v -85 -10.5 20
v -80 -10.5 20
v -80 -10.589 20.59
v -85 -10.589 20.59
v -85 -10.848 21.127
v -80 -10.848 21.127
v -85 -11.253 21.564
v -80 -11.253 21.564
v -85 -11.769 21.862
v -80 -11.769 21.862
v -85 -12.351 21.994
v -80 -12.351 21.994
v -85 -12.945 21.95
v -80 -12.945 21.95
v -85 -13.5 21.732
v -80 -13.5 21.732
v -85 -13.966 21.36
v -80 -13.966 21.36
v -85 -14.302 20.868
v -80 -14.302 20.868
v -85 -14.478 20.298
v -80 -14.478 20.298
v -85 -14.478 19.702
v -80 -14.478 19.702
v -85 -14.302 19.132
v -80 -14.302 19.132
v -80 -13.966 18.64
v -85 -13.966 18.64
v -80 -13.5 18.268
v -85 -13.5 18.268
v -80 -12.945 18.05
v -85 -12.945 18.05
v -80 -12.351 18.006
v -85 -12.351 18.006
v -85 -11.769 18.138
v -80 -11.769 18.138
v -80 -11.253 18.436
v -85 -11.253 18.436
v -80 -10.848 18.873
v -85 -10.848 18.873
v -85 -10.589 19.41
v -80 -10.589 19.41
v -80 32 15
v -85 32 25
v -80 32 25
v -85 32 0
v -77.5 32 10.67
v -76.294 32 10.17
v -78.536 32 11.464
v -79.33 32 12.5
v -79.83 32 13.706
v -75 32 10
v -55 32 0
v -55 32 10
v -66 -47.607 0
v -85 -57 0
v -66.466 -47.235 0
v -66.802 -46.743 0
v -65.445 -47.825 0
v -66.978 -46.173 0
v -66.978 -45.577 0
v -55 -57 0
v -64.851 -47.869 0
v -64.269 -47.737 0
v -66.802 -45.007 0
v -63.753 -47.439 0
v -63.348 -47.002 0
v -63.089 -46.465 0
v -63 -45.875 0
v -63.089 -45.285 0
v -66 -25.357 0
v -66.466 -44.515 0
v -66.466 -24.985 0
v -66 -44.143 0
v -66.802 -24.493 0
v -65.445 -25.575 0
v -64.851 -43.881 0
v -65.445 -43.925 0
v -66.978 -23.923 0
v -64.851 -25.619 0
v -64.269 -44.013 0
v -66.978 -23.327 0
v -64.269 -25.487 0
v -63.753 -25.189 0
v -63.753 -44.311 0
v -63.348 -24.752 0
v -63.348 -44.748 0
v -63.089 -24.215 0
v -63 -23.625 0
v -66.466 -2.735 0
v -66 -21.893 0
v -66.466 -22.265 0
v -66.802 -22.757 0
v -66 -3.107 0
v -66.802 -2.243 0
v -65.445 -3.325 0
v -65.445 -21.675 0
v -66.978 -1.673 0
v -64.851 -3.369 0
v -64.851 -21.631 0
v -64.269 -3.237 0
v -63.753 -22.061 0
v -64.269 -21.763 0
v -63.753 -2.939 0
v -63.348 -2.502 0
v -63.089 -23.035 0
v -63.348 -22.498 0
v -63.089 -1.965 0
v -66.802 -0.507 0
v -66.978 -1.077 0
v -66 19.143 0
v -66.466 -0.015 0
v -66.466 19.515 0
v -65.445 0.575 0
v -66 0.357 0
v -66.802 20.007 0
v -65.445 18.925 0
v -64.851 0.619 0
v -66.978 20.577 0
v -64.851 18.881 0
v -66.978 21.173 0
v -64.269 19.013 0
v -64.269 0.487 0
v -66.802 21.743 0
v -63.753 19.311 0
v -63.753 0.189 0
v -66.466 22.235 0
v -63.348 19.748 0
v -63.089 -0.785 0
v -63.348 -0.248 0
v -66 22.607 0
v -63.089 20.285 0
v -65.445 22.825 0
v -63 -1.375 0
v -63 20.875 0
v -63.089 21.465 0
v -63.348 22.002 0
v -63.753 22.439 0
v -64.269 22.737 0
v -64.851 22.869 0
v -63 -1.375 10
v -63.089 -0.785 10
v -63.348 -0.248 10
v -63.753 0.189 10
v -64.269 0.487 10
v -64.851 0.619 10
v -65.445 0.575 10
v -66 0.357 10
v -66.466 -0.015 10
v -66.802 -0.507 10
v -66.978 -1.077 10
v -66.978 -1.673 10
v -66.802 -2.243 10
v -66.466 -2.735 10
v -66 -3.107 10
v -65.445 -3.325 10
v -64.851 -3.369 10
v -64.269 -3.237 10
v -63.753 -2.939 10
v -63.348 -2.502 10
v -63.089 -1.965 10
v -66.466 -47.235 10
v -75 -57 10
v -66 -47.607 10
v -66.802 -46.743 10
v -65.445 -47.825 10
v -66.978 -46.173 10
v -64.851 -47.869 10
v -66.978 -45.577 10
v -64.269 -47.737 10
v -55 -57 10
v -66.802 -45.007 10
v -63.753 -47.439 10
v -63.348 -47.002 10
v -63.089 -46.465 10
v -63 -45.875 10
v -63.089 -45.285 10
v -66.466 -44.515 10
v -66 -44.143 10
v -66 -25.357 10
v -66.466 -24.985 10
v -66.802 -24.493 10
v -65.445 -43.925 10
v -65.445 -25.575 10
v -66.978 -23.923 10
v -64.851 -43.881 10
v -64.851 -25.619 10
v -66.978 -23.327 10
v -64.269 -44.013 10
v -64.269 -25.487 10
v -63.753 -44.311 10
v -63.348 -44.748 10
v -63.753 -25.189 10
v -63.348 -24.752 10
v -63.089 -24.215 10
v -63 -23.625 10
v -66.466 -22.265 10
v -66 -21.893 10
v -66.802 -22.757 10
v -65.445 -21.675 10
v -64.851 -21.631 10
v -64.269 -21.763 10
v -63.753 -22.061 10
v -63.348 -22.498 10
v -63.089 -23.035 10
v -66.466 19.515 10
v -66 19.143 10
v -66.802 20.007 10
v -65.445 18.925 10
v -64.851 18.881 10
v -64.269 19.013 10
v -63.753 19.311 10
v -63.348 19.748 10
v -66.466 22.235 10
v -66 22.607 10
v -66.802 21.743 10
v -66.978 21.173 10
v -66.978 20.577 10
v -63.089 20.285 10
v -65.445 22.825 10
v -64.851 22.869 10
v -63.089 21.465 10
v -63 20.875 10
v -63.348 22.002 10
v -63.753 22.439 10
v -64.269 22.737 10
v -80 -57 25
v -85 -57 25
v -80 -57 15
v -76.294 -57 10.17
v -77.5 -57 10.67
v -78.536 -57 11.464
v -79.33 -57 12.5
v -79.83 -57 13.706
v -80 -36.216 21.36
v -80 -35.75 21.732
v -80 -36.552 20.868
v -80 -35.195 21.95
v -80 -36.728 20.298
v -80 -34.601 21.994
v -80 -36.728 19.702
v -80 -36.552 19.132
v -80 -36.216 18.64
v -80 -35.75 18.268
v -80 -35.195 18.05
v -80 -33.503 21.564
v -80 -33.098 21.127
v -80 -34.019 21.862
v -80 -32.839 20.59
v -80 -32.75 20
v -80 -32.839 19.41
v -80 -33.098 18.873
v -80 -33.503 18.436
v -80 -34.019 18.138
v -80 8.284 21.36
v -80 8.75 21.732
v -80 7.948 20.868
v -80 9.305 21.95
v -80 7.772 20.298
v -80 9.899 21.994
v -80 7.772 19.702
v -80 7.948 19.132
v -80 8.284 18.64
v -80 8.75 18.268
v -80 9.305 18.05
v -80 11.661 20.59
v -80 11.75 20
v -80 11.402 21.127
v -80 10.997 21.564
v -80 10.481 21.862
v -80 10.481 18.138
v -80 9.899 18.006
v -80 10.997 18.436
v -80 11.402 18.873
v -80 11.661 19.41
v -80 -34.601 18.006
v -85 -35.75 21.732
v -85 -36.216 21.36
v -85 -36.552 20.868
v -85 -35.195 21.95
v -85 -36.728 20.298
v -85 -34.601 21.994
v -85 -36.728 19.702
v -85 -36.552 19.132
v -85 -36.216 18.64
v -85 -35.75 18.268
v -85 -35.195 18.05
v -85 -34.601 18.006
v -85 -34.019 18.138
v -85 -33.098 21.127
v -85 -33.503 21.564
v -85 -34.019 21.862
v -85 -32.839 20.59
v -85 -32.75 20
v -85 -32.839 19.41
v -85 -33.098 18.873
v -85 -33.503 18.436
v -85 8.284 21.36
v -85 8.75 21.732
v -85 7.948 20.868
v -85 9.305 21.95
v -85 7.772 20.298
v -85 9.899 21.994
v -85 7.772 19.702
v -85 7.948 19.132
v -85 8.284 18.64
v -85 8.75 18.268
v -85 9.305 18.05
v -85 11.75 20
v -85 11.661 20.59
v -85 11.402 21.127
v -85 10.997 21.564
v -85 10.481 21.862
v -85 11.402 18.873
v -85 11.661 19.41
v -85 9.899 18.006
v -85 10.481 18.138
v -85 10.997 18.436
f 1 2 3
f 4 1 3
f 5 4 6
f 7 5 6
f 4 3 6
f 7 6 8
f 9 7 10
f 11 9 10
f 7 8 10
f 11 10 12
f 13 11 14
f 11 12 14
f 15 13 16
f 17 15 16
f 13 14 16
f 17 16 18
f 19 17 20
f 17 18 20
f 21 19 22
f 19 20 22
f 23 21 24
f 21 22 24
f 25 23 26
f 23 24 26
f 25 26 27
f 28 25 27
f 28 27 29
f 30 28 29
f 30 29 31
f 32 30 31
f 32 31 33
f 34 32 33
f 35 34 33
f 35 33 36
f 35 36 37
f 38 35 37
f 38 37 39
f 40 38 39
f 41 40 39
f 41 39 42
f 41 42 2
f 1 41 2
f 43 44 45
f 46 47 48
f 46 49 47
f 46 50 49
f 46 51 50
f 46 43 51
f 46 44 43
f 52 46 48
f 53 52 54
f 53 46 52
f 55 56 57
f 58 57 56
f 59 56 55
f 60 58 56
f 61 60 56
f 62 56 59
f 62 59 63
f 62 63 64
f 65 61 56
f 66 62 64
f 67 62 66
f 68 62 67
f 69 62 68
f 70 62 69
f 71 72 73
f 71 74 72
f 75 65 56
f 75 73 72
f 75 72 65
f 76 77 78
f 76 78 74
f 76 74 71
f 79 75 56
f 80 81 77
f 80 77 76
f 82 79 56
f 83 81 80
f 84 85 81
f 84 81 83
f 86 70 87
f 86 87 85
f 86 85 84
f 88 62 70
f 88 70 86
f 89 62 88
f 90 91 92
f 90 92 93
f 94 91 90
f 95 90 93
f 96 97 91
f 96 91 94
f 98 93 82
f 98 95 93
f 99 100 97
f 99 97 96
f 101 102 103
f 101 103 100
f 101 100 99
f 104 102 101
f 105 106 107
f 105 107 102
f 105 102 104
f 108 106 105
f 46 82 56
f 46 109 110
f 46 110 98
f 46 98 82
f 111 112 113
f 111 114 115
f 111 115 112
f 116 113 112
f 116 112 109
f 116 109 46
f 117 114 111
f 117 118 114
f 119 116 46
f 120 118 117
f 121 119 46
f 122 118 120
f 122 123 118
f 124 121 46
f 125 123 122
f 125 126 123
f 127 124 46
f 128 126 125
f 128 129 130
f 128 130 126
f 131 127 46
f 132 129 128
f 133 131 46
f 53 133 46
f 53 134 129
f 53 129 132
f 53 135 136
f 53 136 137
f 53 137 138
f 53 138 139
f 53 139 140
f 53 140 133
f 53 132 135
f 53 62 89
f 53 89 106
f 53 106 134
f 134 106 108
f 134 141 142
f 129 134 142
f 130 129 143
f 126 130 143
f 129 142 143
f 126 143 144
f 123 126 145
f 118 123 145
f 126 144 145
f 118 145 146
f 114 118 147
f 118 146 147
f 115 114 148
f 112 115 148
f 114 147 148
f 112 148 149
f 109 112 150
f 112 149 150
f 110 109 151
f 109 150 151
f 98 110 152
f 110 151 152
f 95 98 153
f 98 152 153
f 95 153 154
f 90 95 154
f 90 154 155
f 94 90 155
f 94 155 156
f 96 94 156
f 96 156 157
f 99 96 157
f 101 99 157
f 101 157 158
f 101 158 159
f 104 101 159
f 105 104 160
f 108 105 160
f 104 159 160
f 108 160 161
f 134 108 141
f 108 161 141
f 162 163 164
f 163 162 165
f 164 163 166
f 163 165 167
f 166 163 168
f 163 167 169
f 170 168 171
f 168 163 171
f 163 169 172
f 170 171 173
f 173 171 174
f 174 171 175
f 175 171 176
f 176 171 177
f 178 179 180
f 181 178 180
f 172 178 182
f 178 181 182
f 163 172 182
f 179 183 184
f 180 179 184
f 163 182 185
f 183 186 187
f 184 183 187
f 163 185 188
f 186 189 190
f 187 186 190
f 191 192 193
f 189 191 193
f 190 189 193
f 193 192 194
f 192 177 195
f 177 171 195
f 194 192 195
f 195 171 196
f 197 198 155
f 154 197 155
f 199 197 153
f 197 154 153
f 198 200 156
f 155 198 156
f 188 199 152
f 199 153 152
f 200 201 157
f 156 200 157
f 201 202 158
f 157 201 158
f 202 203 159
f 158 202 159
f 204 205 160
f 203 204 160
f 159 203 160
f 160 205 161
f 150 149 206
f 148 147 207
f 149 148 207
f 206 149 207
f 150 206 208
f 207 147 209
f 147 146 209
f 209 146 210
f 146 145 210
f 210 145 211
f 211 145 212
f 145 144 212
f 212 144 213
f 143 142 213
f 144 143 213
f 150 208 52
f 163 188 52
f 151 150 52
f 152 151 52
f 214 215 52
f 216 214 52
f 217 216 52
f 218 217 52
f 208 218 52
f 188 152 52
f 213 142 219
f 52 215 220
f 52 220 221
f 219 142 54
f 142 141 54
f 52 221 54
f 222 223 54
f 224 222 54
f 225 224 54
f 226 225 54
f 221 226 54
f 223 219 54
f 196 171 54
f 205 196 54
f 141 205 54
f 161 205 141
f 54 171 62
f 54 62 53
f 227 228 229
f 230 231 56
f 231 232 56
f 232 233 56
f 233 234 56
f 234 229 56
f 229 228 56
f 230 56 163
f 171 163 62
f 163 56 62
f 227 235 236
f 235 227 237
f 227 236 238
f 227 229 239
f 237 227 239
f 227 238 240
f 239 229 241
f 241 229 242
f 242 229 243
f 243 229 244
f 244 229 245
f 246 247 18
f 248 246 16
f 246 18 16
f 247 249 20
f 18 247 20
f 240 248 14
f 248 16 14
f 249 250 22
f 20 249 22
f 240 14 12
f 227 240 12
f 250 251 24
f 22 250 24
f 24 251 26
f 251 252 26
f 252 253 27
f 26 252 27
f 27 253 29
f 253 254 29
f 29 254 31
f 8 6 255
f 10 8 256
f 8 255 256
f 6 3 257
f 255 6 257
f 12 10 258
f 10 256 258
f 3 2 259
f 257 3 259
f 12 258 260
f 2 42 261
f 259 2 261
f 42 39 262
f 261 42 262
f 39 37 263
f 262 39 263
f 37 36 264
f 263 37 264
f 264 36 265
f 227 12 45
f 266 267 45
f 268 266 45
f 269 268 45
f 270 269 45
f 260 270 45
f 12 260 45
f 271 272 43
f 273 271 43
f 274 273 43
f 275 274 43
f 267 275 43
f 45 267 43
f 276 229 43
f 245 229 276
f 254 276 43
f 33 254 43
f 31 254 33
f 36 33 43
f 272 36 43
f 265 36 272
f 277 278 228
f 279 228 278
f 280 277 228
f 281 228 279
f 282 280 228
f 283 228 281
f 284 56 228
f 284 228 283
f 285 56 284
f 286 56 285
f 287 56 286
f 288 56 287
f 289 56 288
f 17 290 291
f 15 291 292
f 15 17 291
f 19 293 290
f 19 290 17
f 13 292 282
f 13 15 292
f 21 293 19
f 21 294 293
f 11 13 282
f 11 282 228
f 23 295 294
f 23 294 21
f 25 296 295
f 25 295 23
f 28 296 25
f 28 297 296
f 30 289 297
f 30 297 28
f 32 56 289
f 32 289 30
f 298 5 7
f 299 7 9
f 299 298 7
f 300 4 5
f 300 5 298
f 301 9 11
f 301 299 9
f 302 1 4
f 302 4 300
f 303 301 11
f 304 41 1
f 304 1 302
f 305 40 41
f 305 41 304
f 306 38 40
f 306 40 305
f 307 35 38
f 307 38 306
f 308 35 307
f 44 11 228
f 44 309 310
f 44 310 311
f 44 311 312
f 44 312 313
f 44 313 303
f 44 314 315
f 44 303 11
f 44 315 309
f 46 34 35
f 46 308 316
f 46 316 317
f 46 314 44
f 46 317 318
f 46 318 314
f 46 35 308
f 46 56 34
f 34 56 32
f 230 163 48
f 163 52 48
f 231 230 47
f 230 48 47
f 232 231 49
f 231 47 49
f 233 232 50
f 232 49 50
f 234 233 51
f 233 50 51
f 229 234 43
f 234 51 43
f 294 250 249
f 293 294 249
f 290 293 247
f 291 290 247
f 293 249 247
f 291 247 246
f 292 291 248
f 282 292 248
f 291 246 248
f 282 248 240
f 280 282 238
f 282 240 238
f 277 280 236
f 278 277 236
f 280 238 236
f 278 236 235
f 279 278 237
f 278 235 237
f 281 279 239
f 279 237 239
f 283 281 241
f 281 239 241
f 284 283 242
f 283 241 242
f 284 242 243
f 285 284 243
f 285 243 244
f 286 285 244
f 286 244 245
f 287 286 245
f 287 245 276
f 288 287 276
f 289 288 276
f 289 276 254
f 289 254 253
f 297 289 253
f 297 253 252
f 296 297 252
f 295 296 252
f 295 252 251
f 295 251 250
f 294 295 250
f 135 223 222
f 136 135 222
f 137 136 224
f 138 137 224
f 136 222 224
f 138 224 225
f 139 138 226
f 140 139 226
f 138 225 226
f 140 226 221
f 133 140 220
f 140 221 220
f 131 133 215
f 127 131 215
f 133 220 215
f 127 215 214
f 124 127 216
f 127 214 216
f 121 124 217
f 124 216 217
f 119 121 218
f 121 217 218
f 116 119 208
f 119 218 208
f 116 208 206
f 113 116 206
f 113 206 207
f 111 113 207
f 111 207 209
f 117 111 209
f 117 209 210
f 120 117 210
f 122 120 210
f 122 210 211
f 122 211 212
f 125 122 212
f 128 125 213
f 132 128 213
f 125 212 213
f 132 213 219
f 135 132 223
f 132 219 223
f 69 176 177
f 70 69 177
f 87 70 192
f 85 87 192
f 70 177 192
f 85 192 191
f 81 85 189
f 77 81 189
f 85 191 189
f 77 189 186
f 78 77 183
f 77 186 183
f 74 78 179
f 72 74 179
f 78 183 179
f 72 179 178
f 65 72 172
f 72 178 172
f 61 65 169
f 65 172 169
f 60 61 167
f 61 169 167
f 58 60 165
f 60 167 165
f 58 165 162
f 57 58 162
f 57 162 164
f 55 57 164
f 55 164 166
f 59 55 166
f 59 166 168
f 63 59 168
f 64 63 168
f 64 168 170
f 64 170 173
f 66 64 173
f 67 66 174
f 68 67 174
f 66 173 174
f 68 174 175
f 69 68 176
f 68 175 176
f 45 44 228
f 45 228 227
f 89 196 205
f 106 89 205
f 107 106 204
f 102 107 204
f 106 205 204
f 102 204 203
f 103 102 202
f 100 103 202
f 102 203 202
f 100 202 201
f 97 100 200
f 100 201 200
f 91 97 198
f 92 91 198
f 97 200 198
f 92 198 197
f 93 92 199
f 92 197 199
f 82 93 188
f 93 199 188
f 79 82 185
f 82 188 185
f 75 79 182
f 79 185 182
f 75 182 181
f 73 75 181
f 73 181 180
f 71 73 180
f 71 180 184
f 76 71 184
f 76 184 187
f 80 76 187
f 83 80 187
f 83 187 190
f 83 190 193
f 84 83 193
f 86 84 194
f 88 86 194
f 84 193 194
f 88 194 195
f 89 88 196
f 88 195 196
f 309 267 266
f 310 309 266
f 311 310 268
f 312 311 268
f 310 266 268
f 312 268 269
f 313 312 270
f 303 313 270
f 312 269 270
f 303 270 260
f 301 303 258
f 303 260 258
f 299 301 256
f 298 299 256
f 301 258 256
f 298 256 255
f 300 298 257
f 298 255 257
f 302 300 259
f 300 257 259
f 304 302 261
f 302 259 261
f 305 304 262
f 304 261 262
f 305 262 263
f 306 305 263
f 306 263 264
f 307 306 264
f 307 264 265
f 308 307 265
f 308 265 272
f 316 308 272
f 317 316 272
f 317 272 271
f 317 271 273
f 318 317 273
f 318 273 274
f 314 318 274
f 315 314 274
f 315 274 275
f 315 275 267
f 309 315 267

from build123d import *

# Parameters (mm, degrees)
BOSS_EXTRUDE1_DEPTH     = 10
CUT_EXTRUDE1_DEPTH      = 72.414284285
CUT_EXTRUDE1_DEPTH_BACK = 72.414284285
SKETCH2_R               = 1.5
SKETCH9_W               = 10
SKETCH9_H               = 50
BOSS_EXTRUDE9_DEPTH     = 5
SKETCH10_W              = 10
SKETCH10_H              = 50
BOSS_EXTRUDE10_DEPTH    = 5
BOSS_EXTRUDE11_DEPTH    = 2
SKETCH12_W              = 10
SKETCH12_H              = 10
BOSS_EXTRUDE12_DEPTH    = 5
CUT_EXTRUDE2_START      = 7
SKETCH13_R              = 1.5
CUT_EXTRUDE2_DEPTH      = 7
BOSS_EXTRUDE13_DEPTH    = 2
SKETCH15_W              = 9.981523119
SKETCH15_H              = 10
BOSS_EXTRUDE14_DEPTH    = 30
SKETCH16_R              = 1.5
CUT_EXTRUDE3_DEPTH      = 32
SKETCH17_W              = 10
SKETCH17_H              = 89
BOSS_EXTRUDE15_DEPTH    = 30
SKETCH19_W              = 5
SKETCH19_H              = 89
BOSS_EXTRUDE16_DEPTH    = 15
FILLET1_R               = 5
SKETCH20_R              = 2
CUT_EXTRUDE4_DEPTH      = 149.657324071
SKETCH21_R              = 2
CUT_EXTRUDE5_DEPTH      = 10
SKETCH22_W              = 110
SKETCH22_H              = 89
CUT_EXTRUDE6_DEPTH      = 104.435970532


with BuildPart() as part:
    # Sketch1 → Boss-Extrude1 (new body)
    with BuildSketch(Plane.XY):
        with BuildLine():
            Line((45.018476881, -25), (50, -25))
            Line((50, -25), (50, 25))
            Line((50, 25), (45, 25))
            ThreePointArc((45, 25), (0, 8), (-45, 25))
            Line((-45, 25), (-50, 25))
            Line((-50, 25), (-50, -25))
            Line((-50, -25), (-45.018476881, -25))
            ThreePointArc((-45.018476881, -25), (0, -8), (45.018476881, -25))
        make_face()
    extrude(amount=BOSS_EXTRUDE1_DEPTH)

    # Sketch2 → Cut-Extrude1 (cut, two sides: drawn at the far end of the back side and taken through both)
    with BuildSketch(Plane(origin=(0, 25, 0), x_dir=(1, 0, 0), z_dir=(0, 1, 0)).offset(-CUT_EXTRUDE1_DEPTH_BACK)):
        with Locations(Location((-48, -5, 0), (0, 0, 180))):
            Circle(SKETCH2_R)
        with Locations(Location((48, -5, 0), (0, 0, 180))):
            Circle(SKETCH2_R)
    extrude(amount=CUT_EXTRUDE1_DEPTH + CUT_EXTRUDE1_DEPTH_BACK, mode=Mode.SUBTRACT)

    # Sketch9 → Boss-Extrude9 (add)
    with BuildSketch(Plane(origin=(50, 0, 0), x_dir=(0, 0, -1), z_dir=(1, 0, 0))):
        with Locations((-5, 0)):
            Rectangle(SKETCH9_W, SKETCH9_H)
    extrude(amount=BOSS_EXTRUDE9_DEPTH)

    # Sketch10 → Boss-Extrude10 (add)
    with BuildSketch(Plane.ZY.offset(50)):
        with Locations((5, 0)):
            Rectangle(SKETCH10_W, SKETCH10_H)
    extrude(amount=BOSS_EXTRUDE10_DEPTH)

    # Sketch11 → Boss-Extrude11 (add)
    with BuildSketch(Plane(origin=(0, 25, 0), x_dir=(1, 0, 0), z_dir=(0, 1, 0))):
        Polygon((50, 0), (50, -7), (45, -7), (45, -10), (55, -10), (55, 0), align=None)
        Polygon((-50, 0), (-50, -7), (-45, -7), (-45, -10), (-55, -10), (-55, 0), align=None)
    extrude(amount=BOSS_EXTRUDE11_DEPTH)

    # Sketch12 → Boss-Extrude12 (add)
    with BuildSketch(Plane(origin=(0, 27, 0), x_dir=(1, 0, 0), z_dir=(0, 1, 0))):
        with Locations((50, -5)):
            Rectangle(SKETCH12_W, SKETCH12_H)
        with Locations((-50, -5)):
            Rectangle(SKETCH12_W, SKETCH12_H)
    extrude(amount=BOSS_EXTRUDE12_DEPTH)

    # Sketch13 → Cut-Extrude2 (cut)
    with BuildSketch(Plane(origin=(0, 25, 0), x_dir=(1, 0, 0), z_dir=(0, 1, 0)).offset(CUT_EXTRUDE2_START)):
        with Locations(Location((48, -5, 0), (0, 0, 180))):
            Circle(SKETCH13_R)
        with Locations(Location((-48, -5, 0), (0, 0, 180))):
            Circle(SKETCH13_R)
    extrude(amount=-CUT_EXTRUDE2_DEPTH, mode=Mode.SUBTRACT)

    # Sketch14 → Boss-Extrude13 (add)
    with BuildSketch(Plane.XZ.offset(25)):
        Polygon((50.009238441, 0), (50.009238441, 7), (45.018476881, 7), (45.018476881, 10), (55, 10), (55, 0), align=None)
        Polygon((-50.009238441, 0), (-50.009238441, 7), (-45.018476881, 7), (-45.018476881, 10), (-55, 10), (-55, 0), align=None)
    extrude(amount=BOSS_EXTRUDE13_DEPTH)

    # Sketch15 → Boss-Extrude14 (add)
    with BuildSketch(Plane.XZ.offset(27)):
        with Locations((-50.00923844, 5)):
            Rectangle(SKETCH15_W, SKETCH15_H)
        with Locations((50.00923844, 5)):
            Rectangle(SKETCH15_W, SKETCH15_H)
    extrude(amount=BOSS_EXTRUDE14_DEPTH)

    # Sketch16 → Cut-Extrude3 (cut)
    with BuildSketch(Plane.XZ.offset(25)):
        with Locations(Location((48, 5, 0), (0, 0, 180))):
            Circle(SKETCH16_R)
        with Locations(Location((-48, 5, 0), (0, 0, 180))):
            Circle(SKETCH16_R)
    extrude(amount=CUT_EXTRUDE3_DEPTH, mode=Mode.SUBTRACT)

    # Sketch17 → Boss-Extrude15 (add)
    with BuildSketch(Plane.ZY.offset(55)):
        with Locations((5, -12.5)):
            Rectangle(SKETCH17_W, SKETCH17_H)
    extrude(amount=BOSS_EXTRUDE15_DEPTH)

    # Sketch19 → Boss-Extrude16 (add)
    with BuildSketch(Plane.XY.offset(10)):
        with Locations((-82.5, -12.5)):
            Rectangle(SKETCH19_W, SKETCH19_H)
    extrude(amount=BOSS_EXTRUDE16_DEPTH)

    # Fillet1
    fillet1_edges = [part.edges().sort_by_distance(p)[0] for p in [
        (-80, -12.5, 10),
    ]]
    fillet(fillet1_edges, radius=FILLET1_R)

    # Sketch20 → Cut-Extrude4 (cut, through all)
    with BuildSketch(Plane(origin=(-80, 0, 0), x_dir=(0, 0, -1), z_dir=(1, 0, 0))):
        with Locations(Location((-20, 9.75, 0), (0, 0, 90))):
            Circle(SKETCH20_R)
        with Locations(Location((-20, -12.5, 0), (0, 0, 90))):
            Circle(SKETCH20_R)
        with Locations(Location((-20, -34.75, 0), (0, 0, 90))):
            Circle(SKETCH20_R)
    extrude(amount=-CUT_EXTRUDE4_DEPTH, mode=Mode.SUBTRACT)

    # Sketch21 → Cut-Extrude5 (cut)
    with BuildSketch(Plane.XY.offset(10)):
        with Locations((-65, 20.875)):
            Circle(SKETCH21_R)
        with Locations((-65, -1.375)):
            Circle(SKETCH21_R)
        with Locations((-65, -23.625)):
            Circle(SKETCH21_R)
        with Locations((-65, -45.875)):
            Circle(SKETCH21_R)
    extrude(amount=-CUT_EXTRUDE5_DEPTH, mode=Mode.SUBTRACT)

    # Sketch22 → Cut-Extrude6 (cut, through all)
    with BuildSketch(Plane.XY.offset(10)):
        with Locations((0, -12.5)):
            Rectangle(SKETCH22_W, SKETCH22_H)
    extrude(amount=-CUT_EXTRUDE6_DEPTH, mode=Mode.SUBTRACT)


solid = part.part
